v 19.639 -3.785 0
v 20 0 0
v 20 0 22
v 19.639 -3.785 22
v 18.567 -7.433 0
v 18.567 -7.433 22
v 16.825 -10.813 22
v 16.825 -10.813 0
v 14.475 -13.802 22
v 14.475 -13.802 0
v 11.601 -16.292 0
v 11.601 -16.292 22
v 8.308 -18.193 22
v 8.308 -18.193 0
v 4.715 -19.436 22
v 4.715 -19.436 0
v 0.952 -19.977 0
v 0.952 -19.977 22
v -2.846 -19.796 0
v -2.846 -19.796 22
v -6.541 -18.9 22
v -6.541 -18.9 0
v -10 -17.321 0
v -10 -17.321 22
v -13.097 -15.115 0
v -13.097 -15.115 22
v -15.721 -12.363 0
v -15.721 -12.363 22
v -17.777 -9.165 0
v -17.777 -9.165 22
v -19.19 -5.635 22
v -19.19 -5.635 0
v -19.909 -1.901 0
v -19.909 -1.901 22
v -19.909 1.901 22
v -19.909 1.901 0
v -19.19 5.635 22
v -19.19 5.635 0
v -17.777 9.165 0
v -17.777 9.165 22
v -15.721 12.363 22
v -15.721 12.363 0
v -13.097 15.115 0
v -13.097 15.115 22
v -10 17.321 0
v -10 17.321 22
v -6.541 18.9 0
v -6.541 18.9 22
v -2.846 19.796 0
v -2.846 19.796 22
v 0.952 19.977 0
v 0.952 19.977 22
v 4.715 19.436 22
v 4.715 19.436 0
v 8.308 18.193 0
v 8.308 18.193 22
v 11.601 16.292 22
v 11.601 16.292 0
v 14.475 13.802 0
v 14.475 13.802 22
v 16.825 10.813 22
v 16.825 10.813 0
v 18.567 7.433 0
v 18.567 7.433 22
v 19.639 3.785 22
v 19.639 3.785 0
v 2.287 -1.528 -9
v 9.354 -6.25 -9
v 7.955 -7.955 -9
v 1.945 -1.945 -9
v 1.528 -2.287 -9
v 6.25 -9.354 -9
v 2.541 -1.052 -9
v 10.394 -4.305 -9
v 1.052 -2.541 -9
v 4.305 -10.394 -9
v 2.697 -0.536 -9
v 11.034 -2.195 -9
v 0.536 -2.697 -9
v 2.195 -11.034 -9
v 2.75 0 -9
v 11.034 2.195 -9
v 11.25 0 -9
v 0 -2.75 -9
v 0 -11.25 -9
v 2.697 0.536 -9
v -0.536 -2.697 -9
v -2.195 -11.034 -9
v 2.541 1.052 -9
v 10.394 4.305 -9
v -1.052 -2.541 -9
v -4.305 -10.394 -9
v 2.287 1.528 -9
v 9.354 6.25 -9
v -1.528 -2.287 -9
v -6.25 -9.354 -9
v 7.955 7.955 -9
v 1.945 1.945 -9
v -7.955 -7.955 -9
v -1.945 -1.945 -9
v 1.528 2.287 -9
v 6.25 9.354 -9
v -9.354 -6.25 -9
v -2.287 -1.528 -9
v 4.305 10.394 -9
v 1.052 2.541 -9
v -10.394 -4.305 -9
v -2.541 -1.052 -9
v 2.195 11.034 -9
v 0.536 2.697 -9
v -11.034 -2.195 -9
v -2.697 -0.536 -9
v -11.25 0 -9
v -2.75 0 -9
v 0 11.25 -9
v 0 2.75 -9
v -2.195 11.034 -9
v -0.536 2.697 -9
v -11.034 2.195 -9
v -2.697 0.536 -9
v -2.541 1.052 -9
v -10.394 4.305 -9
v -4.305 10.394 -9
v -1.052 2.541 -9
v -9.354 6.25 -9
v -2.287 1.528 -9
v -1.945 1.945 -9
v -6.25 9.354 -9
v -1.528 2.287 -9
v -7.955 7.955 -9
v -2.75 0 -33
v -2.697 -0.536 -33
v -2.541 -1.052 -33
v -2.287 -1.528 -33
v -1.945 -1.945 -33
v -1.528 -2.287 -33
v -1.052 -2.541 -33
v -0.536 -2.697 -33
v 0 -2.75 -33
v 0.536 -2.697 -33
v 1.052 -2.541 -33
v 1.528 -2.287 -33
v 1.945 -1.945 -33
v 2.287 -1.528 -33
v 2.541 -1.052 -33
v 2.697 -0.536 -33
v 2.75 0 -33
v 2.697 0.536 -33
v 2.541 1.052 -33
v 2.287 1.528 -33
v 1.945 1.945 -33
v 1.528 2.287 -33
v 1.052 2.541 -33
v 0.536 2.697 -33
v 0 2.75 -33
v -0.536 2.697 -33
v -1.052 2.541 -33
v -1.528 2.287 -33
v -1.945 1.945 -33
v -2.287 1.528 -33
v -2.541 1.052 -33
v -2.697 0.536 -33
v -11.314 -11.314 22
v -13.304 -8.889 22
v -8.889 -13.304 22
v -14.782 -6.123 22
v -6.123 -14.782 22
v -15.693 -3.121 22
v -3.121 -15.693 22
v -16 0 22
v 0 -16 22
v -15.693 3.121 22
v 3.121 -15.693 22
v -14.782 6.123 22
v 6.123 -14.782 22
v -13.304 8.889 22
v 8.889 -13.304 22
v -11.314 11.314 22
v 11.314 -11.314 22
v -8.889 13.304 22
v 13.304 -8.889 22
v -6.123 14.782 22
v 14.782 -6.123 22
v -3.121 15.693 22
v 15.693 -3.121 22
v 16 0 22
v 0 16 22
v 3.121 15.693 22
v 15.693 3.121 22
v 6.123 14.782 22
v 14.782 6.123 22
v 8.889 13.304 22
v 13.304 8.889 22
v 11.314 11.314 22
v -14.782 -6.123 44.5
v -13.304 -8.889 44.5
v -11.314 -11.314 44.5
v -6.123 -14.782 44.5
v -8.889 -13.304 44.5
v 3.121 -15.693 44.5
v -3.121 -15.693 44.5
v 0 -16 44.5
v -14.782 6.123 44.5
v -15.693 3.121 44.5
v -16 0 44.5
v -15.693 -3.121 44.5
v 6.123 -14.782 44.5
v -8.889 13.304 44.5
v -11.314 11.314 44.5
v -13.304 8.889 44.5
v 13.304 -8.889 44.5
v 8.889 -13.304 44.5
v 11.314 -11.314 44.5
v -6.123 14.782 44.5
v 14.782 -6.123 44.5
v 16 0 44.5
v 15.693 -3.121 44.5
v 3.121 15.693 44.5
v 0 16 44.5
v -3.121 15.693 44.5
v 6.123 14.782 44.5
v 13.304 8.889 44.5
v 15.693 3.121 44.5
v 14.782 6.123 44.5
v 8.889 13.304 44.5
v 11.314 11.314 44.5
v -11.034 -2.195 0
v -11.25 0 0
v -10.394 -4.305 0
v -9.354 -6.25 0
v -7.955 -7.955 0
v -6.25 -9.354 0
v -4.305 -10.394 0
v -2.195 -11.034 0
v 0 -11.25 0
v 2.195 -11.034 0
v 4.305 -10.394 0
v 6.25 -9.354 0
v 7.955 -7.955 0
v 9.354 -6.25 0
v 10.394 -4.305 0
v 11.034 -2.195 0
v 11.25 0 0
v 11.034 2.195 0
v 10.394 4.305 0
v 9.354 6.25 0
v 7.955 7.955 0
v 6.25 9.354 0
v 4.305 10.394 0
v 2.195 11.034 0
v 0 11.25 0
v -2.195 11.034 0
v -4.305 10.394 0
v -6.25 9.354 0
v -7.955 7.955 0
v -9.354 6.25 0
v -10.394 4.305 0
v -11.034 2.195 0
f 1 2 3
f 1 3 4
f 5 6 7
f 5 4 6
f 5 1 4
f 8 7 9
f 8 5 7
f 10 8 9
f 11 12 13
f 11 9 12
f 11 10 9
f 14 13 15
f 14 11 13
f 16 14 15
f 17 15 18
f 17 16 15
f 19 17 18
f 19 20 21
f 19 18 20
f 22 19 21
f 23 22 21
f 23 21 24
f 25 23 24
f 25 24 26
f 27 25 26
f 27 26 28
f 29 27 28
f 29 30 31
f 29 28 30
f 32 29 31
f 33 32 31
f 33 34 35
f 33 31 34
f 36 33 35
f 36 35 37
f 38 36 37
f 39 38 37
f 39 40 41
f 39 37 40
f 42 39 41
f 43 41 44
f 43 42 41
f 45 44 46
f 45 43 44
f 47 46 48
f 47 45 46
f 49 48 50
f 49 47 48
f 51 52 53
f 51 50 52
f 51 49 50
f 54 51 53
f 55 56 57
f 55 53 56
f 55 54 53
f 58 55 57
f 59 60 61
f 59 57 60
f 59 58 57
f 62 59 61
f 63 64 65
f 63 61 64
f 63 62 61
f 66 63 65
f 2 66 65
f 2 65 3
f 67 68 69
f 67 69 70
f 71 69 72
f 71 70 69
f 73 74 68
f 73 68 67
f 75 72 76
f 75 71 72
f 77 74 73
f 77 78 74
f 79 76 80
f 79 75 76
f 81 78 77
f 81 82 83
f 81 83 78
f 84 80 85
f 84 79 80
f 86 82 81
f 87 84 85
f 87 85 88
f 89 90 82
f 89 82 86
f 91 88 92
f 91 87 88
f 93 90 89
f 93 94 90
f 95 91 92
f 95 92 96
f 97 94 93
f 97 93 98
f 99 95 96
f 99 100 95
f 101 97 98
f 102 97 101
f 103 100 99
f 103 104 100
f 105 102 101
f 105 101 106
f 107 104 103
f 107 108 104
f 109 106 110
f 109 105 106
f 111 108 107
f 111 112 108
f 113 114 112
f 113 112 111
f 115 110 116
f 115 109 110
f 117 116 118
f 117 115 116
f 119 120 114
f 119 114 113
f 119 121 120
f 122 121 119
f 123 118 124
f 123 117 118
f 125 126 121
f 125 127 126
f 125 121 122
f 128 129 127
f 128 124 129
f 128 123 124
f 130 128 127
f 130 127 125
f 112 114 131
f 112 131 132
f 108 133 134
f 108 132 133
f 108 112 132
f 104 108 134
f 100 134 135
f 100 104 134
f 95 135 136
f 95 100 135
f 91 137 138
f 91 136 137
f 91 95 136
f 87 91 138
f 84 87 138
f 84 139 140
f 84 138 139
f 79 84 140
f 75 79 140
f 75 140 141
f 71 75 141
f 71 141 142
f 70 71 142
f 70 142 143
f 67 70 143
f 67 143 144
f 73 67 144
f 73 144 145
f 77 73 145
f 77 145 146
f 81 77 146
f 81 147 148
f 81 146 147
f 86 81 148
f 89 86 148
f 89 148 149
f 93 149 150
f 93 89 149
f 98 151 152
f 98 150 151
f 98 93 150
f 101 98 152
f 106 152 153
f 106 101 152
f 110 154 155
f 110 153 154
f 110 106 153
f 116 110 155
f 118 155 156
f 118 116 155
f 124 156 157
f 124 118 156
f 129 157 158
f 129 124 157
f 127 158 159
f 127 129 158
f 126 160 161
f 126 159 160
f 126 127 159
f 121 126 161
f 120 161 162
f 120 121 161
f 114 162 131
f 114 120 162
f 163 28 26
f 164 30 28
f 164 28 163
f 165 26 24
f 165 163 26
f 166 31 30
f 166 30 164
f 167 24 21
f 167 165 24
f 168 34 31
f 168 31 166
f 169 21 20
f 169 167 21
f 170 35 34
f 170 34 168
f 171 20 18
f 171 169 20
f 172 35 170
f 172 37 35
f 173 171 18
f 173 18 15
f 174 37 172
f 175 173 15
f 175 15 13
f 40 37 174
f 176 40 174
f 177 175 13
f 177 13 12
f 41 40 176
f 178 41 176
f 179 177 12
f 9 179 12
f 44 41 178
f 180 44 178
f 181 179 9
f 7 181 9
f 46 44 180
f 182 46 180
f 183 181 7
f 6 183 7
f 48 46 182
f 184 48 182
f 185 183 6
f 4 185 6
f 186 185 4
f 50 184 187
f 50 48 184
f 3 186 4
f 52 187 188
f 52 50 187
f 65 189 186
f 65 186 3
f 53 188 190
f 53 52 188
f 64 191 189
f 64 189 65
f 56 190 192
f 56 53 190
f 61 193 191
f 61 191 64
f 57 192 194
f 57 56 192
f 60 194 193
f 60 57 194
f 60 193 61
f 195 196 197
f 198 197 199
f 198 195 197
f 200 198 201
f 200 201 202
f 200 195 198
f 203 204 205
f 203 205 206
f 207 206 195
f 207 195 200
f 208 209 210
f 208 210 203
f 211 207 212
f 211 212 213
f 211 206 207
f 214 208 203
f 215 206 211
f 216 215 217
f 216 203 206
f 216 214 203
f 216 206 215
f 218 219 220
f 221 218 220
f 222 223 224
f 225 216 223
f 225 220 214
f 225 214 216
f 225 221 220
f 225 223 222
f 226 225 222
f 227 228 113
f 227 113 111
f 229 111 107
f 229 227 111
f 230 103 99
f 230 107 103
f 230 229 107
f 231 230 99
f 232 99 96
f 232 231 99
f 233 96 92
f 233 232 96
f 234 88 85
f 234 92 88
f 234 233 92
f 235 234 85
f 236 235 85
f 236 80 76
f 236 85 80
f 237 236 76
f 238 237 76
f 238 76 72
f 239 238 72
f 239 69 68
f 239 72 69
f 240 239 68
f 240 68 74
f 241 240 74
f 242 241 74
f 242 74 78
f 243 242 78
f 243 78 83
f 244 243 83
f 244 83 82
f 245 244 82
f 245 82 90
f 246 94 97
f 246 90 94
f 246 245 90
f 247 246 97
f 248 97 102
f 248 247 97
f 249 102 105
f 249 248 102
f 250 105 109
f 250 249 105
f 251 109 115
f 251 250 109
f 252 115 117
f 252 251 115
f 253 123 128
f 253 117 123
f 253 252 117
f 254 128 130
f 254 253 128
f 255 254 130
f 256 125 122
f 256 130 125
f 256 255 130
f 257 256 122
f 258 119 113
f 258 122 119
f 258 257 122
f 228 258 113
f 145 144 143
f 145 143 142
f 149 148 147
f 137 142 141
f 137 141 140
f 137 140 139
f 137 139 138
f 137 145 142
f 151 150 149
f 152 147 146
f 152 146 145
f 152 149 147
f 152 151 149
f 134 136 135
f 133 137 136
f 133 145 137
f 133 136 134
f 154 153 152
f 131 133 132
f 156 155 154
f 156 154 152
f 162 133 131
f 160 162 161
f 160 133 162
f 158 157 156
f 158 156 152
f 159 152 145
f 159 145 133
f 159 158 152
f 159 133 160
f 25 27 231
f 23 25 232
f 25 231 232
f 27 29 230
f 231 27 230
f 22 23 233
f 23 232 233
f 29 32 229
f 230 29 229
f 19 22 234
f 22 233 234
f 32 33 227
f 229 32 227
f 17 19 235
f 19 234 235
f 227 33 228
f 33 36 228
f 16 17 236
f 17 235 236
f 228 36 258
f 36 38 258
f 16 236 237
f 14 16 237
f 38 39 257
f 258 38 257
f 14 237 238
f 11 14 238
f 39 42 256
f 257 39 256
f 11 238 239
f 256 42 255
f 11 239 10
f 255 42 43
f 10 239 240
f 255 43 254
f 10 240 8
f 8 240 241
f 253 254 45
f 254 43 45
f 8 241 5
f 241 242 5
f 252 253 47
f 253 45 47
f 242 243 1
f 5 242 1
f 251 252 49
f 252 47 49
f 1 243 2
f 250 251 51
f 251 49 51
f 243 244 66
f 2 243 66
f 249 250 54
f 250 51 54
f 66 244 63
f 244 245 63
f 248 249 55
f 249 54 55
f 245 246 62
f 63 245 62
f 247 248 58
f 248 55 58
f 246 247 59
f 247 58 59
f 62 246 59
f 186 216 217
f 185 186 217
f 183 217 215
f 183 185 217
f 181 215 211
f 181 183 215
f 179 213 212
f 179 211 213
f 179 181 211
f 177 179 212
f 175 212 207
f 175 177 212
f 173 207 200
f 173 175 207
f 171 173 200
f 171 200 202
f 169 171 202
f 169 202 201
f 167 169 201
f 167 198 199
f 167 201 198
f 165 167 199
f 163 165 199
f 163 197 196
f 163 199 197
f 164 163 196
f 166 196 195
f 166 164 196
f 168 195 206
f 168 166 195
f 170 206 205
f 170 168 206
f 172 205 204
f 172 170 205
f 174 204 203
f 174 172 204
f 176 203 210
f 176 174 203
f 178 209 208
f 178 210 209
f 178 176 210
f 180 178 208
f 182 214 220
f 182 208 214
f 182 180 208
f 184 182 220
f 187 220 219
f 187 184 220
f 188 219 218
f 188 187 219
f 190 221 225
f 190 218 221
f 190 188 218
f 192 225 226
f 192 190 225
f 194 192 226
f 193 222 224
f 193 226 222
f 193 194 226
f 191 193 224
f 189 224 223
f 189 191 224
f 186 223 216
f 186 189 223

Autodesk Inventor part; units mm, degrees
ref_plane "YZ Plane" through (0, 0, 0) normal (1, 0, 0) x (0, 1, 0)
ref_plane "XZ Plane" through (0, 0, 0) normal (0, 1, 0) x (-1, 0, 0)
ref_plane "XY Plane" through (0, 0, 0) normal (0, 0, 1) x (1, 0, 0)
sketch "Sketch1" plane through (0, 0, 0) normal (0, 0, 1) x (1, 0, 0)
  point P0 (0, 0)
sketch "Sketch2" plane through (0, 0, 0) normal (0, 0, 1) x (1, 0, 0)
  circle A0 centre (0, 0) radius 20
  dimension "d0" = 40
extrude "Extrusion1" add sketch "Sketch2" along normal blind 22
sketch "Sketch3" plane through (0, 0, 22) normal (0, 0, 1) x (1, 0, 0)
  circle A0 centre (0, 0) radius 16
  dimension "d3" = 32
extrude "Extrusion2" add sketch "Sketch3" along normal blind 22.5
sketch "Sketch4" plane through (0, 0, 44.5) normal (0, 0, 1) x (1, 0, 0)
  point P0 (0, 0)
sketch "Sketch5" plane through (0, 0, 0) normal (0, 0, -1) x (-1, 0, 0)
  circle A0 centre (0, 0) radius 11.25
  dimension "d8" = 22.5
extrude "Extrusion3" add sketch "Sketch5" along normal blind 9
sketch "Sketch6" plane through (0, 0, -9) normal (0, 0, -1) x (-1, 0, 0)
  circle A0 centre (0, 0) radius 2.75
  dimension "d11" = 5.5
extrude "Extrusion4" add sketch "Sketch6" along normal blind 24
properties part number "DC MOTOR 1"
